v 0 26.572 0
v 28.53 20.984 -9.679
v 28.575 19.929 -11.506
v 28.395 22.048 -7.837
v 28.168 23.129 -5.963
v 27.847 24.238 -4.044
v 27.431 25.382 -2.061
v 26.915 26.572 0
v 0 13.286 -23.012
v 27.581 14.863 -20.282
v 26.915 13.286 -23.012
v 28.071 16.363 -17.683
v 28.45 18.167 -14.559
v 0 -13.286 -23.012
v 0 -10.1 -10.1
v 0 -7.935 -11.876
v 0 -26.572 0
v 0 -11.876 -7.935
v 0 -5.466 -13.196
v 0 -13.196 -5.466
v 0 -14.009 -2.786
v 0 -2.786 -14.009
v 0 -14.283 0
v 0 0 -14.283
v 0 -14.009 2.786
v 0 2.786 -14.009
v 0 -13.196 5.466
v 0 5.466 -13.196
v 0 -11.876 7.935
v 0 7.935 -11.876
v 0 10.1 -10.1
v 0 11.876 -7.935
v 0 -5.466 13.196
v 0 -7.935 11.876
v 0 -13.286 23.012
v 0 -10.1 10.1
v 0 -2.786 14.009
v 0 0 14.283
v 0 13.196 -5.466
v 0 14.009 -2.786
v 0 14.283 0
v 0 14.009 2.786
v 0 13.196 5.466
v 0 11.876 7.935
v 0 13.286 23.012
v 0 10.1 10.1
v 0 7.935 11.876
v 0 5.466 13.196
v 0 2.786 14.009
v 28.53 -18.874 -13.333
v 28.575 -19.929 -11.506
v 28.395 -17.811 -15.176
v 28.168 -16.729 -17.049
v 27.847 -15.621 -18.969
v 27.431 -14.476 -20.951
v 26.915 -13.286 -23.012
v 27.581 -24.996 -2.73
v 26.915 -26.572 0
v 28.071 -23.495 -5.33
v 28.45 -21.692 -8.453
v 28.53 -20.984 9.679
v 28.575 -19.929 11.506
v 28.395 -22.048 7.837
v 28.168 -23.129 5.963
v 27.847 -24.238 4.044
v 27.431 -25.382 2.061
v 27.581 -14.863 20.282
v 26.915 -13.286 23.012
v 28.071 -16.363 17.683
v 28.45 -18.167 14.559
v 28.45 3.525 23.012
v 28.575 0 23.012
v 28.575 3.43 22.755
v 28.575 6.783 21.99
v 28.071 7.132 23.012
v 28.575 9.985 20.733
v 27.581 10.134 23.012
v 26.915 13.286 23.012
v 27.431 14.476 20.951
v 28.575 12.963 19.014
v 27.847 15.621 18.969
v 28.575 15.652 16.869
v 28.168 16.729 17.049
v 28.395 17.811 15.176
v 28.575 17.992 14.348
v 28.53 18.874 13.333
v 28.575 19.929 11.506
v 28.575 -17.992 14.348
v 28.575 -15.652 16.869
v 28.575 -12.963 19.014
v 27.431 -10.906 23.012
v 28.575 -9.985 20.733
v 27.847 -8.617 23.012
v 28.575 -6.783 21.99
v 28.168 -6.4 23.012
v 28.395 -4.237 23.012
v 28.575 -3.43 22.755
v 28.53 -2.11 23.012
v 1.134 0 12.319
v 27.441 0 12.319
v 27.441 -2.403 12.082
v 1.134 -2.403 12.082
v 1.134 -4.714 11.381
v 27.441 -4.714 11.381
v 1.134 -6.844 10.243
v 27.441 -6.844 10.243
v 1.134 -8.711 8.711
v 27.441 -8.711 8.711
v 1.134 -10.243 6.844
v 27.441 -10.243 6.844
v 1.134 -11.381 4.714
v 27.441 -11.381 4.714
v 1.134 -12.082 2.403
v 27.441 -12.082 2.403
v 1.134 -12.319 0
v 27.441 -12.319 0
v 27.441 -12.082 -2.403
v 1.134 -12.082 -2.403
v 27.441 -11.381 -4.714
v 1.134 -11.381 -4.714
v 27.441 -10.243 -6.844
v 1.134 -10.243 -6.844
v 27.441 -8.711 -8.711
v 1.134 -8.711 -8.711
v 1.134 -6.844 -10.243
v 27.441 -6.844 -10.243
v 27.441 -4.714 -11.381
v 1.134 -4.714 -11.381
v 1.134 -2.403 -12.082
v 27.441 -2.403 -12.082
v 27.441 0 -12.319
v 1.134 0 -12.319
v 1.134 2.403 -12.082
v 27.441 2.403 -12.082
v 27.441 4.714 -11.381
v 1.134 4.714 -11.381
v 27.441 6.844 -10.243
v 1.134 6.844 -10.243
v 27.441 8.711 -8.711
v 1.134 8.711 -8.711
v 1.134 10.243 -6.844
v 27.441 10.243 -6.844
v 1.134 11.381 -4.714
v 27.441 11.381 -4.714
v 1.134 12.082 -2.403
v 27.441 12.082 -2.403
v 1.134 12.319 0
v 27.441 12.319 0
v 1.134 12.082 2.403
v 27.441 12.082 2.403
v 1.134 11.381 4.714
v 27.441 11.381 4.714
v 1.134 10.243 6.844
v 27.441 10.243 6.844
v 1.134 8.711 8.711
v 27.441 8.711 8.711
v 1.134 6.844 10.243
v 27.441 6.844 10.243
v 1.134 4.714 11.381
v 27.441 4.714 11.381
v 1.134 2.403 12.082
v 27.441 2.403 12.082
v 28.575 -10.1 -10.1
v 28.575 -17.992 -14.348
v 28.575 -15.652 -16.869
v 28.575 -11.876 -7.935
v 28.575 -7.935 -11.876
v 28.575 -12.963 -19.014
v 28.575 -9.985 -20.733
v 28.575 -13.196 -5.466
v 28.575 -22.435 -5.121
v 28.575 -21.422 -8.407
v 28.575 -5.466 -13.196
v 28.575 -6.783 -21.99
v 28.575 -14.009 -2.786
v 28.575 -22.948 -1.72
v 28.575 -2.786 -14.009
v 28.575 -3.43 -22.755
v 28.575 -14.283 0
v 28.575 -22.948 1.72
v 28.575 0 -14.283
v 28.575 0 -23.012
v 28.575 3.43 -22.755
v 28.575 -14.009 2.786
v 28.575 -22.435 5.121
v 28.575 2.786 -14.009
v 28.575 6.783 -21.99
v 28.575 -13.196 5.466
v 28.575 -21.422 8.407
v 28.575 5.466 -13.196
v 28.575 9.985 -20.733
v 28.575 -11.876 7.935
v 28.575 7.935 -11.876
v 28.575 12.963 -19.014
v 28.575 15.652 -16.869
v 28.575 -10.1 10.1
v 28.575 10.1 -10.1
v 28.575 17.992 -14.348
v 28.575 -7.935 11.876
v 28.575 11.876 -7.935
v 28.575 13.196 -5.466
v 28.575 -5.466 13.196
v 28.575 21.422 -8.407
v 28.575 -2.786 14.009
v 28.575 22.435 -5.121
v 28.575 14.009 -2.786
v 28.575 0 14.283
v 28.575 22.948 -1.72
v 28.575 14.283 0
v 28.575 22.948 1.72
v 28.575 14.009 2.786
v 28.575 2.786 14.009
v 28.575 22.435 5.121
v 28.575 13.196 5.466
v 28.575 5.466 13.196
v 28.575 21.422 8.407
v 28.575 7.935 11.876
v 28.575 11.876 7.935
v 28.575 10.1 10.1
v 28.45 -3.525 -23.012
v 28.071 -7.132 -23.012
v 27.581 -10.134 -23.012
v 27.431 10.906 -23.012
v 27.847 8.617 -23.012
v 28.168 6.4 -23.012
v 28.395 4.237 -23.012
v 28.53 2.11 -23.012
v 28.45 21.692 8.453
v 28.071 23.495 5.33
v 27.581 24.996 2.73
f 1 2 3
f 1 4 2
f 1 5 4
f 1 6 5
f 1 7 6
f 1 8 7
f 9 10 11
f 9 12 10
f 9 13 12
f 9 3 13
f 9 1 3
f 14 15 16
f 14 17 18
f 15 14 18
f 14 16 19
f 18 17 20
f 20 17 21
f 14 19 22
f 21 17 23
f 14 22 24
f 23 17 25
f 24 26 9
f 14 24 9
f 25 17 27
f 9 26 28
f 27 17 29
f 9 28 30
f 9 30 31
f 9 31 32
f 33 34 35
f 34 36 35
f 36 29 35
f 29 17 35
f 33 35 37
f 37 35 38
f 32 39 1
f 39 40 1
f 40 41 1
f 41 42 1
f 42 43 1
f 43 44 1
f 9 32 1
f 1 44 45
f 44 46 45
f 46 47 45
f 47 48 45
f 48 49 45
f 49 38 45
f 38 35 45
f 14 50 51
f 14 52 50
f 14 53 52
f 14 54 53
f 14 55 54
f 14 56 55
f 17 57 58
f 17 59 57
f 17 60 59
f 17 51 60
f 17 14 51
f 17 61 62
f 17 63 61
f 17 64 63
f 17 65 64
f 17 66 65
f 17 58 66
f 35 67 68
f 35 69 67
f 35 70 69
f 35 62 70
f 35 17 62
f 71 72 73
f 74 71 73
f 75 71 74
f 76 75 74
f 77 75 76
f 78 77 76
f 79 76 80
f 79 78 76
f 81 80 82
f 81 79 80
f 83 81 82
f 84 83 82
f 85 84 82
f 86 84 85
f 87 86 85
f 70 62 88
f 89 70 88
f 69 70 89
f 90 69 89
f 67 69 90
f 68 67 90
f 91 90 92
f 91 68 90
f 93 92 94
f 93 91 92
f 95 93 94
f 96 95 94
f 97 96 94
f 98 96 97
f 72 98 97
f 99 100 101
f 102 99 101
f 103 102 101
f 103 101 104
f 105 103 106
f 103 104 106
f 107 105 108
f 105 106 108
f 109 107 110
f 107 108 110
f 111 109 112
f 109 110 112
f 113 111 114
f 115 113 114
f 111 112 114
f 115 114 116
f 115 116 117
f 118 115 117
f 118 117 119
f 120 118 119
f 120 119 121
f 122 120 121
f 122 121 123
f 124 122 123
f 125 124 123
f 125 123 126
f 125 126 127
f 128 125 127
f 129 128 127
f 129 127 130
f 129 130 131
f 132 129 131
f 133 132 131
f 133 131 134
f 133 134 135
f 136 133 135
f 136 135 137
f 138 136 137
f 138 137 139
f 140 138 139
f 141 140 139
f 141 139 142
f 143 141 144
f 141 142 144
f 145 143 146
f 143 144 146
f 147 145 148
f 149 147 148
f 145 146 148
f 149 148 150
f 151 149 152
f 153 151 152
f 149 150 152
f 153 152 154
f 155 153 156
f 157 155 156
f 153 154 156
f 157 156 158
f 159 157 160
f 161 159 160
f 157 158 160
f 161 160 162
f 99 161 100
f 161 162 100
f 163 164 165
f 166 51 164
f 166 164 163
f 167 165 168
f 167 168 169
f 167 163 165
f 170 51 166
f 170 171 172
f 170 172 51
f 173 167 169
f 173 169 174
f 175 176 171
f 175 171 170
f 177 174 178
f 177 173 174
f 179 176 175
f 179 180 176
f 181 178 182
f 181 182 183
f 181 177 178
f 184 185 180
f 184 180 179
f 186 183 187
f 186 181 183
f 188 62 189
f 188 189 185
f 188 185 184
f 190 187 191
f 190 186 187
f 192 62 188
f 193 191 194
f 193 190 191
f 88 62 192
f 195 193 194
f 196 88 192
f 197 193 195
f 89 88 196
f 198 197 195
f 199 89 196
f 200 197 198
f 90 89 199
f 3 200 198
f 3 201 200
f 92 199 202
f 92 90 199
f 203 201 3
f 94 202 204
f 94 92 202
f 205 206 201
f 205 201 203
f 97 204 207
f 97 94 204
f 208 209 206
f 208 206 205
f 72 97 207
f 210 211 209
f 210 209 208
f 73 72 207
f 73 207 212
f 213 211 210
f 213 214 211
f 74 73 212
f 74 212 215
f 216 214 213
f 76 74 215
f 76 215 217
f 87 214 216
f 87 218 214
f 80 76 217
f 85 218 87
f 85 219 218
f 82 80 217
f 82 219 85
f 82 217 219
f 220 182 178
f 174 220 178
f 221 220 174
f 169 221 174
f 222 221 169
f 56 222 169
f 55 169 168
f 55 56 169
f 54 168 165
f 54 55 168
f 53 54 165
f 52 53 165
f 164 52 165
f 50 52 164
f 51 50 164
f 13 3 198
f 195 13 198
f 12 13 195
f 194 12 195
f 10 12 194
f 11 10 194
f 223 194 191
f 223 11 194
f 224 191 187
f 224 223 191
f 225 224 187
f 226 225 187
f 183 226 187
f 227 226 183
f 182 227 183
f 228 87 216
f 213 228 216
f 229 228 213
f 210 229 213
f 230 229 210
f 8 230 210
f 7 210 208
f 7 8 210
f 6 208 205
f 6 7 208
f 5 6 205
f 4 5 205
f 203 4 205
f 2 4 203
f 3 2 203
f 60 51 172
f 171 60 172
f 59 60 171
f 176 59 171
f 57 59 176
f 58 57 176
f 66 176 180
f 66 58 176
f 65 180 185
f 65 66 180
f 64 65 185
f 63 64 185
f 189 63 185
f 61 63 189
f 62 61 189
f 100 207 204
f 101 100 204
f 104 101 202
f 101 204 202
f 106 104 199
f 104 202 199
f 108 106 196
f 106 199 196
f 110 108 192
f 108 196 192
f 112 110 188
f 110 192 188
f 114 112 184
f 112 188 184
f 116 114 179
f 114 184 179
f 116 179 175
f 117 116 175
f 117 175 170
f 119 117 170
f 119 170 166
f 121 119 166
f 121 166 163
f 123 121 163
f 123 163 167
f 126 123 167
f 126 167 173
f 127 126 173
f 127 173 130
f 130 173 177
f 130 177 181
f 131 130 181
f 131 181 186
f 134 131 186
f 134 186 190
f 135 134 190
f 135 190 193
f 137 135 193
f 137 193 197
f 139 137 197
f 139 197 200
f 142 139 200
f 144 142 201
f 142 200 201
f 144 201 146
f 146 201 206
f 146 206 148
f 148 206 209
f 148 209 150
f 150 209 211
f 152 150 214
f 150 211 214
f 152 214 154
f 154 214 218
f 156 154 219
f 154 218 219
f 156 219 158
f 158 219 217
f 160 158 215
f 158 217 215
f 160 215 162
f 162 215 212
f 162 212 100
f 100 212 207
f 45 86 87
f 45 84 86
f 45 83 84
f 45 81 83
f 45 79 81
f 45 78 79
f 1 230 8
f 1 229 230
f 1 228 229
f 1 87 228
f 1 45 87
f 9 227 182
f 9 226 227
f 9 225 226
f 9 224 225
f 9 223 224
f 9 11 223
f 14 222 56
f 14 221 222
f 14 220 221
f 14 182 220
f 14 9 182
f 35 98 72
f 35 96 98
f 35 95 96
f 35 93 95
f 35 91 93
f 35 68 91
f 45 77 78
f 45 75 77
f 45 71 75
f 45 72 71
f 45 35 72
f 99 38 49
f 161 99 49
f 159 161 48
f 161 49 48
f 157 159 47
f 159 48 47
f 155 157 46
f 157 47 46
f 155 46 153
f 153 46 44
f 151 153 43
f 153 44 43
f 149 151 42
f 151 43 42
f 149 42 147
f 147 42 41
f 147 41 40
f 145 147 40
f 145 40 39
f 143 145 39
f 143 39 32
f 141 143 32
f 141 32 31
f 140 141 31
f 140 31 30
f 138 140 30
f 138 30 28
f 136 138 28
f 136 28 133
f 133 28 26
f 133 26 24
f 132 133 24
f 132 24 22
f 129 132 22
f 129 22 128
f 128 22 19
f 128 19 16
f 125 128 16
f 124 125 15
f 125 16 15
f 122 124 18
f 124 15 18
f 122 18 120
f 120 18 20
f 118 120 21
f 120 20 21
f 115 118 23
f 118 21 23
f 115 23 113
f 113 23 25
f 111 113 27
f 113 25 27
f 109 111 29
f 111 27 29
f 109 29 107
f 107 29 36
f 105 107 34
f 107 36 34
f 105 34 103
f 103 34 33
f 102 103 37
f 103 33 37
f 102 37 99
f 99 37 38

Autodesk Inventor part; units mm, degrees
ref_plane "YZ Plane" through (0, 0, 0) normal (1, 0, 0) x (0, 1, 0)
ref_plane "XZ Plane" through (0, 0, 0) normal (0, 1, 0) x (-1, 0, 0)
sketch "Sketch1" plane through (0, 0, 0) normal (1, 0, 0) x (0, 1, 0)
  line L0 (26.5724, 0) -> (13.2862, -23.0124)
  line L1 (13.2862, -23.0124) -> (-13.2862, -23.0124)
  line L2 (-13.2862, -23.0124) -> (-26.5724, 0)
  line L3 (-26.5724, 0) -> (-13.2862, 23.0124)
  line L4 (-13.2862, 23.0124) -> (13.2862, 23.0124)
  line L5 (13.2862, 23.0124) -> (26.5724, 0)
  point P0 (0, 0)
  point P1 (0, 0)
  dimension "d0" = 53.1449
extrude "Body" add sketch "Sketch1" along normal blind 28.575
sketch "Sketch2" plane through (0, 0, 0) normal (-1, 0, 0) x (0, 0, 1)
  point P0 (0, 0)
hole "Thread" at (0, 0, 0) direction (1, 0, 0) diameter 24.638 end through all thread size "1 1/8-7 UNC" class "2B" standard "ANSI Unified Screw Threads"
chamfer "Chamfer1" distance 1.964 angle 30 1 edges at (0, 0, -12.319) measured on face at (0, -16.6657, 10.0035)
chamfer "Chamfer2" distance 1.964 angle 30 1 edges at (28.575, 0, -12.319) measured on face at (28.575, -16.6657, 10.0035)
sketch "Sketch3" plane through (0, 0, 0) normal (0, 0, 1) x (1, 0, 0)
  line L0 (0, 26.5724) -> (28.575, 26.5724) projected
  line L1 (28.575, 13.2862) -> (28.575, 26.5724) projected
  line L2 (-5.715, 0) -> (34.29, 0) projected
  line L3 (26.9149, 26.5724) -> (28.575, 23.0124)
  dimension "d3" = 46.0248
  dimension "d4" = 25
revolve "Chamfer3" cut sketch "Sketch3" angle 360 about axis through (-10, 0, 0) along (1, 0, 0)
ref_plane "Work Plane1" through (75.8893, 0, 0) normal (0, 0.8660254, -0.5) x (-1, 0, 0)
equation "\"d0\" = 1.1547 * SW"
equation "\"d1\" = KOH"
equation "\"d3\" = SW01"
equation "\"d4\" = ANG2"
equation "\"d13\" = -0.5 * GD1 + 0.5 * NND"
equation "\"d21\" = -0.5 * GD1 + 0.5 * NND"
equation "\"d15\" = -0.5 * GD1 + 0.5 * NND"
equation "\"d22\" = -0.5 * GD1 + 0.5 * NND"
equation "\"ANG2\" = 25deg"
equation "\"NND\" = 28.575"
equation "\"KOH\" = 28.575"
equation "\"SW\" = 46.0248"
equation "\"SW01\" = SW"
equation "\"TOA\" = 30deg"
equation "\"E0\" = 1.155 * SW"
equation "\"THREADDIA\" = 28.575"
equation "\"GD1\" = 24.646956"
properties part number "ANSI B18.2.2 - 1 1/8 - 7, HHFNI" material "Steel, Mild"
